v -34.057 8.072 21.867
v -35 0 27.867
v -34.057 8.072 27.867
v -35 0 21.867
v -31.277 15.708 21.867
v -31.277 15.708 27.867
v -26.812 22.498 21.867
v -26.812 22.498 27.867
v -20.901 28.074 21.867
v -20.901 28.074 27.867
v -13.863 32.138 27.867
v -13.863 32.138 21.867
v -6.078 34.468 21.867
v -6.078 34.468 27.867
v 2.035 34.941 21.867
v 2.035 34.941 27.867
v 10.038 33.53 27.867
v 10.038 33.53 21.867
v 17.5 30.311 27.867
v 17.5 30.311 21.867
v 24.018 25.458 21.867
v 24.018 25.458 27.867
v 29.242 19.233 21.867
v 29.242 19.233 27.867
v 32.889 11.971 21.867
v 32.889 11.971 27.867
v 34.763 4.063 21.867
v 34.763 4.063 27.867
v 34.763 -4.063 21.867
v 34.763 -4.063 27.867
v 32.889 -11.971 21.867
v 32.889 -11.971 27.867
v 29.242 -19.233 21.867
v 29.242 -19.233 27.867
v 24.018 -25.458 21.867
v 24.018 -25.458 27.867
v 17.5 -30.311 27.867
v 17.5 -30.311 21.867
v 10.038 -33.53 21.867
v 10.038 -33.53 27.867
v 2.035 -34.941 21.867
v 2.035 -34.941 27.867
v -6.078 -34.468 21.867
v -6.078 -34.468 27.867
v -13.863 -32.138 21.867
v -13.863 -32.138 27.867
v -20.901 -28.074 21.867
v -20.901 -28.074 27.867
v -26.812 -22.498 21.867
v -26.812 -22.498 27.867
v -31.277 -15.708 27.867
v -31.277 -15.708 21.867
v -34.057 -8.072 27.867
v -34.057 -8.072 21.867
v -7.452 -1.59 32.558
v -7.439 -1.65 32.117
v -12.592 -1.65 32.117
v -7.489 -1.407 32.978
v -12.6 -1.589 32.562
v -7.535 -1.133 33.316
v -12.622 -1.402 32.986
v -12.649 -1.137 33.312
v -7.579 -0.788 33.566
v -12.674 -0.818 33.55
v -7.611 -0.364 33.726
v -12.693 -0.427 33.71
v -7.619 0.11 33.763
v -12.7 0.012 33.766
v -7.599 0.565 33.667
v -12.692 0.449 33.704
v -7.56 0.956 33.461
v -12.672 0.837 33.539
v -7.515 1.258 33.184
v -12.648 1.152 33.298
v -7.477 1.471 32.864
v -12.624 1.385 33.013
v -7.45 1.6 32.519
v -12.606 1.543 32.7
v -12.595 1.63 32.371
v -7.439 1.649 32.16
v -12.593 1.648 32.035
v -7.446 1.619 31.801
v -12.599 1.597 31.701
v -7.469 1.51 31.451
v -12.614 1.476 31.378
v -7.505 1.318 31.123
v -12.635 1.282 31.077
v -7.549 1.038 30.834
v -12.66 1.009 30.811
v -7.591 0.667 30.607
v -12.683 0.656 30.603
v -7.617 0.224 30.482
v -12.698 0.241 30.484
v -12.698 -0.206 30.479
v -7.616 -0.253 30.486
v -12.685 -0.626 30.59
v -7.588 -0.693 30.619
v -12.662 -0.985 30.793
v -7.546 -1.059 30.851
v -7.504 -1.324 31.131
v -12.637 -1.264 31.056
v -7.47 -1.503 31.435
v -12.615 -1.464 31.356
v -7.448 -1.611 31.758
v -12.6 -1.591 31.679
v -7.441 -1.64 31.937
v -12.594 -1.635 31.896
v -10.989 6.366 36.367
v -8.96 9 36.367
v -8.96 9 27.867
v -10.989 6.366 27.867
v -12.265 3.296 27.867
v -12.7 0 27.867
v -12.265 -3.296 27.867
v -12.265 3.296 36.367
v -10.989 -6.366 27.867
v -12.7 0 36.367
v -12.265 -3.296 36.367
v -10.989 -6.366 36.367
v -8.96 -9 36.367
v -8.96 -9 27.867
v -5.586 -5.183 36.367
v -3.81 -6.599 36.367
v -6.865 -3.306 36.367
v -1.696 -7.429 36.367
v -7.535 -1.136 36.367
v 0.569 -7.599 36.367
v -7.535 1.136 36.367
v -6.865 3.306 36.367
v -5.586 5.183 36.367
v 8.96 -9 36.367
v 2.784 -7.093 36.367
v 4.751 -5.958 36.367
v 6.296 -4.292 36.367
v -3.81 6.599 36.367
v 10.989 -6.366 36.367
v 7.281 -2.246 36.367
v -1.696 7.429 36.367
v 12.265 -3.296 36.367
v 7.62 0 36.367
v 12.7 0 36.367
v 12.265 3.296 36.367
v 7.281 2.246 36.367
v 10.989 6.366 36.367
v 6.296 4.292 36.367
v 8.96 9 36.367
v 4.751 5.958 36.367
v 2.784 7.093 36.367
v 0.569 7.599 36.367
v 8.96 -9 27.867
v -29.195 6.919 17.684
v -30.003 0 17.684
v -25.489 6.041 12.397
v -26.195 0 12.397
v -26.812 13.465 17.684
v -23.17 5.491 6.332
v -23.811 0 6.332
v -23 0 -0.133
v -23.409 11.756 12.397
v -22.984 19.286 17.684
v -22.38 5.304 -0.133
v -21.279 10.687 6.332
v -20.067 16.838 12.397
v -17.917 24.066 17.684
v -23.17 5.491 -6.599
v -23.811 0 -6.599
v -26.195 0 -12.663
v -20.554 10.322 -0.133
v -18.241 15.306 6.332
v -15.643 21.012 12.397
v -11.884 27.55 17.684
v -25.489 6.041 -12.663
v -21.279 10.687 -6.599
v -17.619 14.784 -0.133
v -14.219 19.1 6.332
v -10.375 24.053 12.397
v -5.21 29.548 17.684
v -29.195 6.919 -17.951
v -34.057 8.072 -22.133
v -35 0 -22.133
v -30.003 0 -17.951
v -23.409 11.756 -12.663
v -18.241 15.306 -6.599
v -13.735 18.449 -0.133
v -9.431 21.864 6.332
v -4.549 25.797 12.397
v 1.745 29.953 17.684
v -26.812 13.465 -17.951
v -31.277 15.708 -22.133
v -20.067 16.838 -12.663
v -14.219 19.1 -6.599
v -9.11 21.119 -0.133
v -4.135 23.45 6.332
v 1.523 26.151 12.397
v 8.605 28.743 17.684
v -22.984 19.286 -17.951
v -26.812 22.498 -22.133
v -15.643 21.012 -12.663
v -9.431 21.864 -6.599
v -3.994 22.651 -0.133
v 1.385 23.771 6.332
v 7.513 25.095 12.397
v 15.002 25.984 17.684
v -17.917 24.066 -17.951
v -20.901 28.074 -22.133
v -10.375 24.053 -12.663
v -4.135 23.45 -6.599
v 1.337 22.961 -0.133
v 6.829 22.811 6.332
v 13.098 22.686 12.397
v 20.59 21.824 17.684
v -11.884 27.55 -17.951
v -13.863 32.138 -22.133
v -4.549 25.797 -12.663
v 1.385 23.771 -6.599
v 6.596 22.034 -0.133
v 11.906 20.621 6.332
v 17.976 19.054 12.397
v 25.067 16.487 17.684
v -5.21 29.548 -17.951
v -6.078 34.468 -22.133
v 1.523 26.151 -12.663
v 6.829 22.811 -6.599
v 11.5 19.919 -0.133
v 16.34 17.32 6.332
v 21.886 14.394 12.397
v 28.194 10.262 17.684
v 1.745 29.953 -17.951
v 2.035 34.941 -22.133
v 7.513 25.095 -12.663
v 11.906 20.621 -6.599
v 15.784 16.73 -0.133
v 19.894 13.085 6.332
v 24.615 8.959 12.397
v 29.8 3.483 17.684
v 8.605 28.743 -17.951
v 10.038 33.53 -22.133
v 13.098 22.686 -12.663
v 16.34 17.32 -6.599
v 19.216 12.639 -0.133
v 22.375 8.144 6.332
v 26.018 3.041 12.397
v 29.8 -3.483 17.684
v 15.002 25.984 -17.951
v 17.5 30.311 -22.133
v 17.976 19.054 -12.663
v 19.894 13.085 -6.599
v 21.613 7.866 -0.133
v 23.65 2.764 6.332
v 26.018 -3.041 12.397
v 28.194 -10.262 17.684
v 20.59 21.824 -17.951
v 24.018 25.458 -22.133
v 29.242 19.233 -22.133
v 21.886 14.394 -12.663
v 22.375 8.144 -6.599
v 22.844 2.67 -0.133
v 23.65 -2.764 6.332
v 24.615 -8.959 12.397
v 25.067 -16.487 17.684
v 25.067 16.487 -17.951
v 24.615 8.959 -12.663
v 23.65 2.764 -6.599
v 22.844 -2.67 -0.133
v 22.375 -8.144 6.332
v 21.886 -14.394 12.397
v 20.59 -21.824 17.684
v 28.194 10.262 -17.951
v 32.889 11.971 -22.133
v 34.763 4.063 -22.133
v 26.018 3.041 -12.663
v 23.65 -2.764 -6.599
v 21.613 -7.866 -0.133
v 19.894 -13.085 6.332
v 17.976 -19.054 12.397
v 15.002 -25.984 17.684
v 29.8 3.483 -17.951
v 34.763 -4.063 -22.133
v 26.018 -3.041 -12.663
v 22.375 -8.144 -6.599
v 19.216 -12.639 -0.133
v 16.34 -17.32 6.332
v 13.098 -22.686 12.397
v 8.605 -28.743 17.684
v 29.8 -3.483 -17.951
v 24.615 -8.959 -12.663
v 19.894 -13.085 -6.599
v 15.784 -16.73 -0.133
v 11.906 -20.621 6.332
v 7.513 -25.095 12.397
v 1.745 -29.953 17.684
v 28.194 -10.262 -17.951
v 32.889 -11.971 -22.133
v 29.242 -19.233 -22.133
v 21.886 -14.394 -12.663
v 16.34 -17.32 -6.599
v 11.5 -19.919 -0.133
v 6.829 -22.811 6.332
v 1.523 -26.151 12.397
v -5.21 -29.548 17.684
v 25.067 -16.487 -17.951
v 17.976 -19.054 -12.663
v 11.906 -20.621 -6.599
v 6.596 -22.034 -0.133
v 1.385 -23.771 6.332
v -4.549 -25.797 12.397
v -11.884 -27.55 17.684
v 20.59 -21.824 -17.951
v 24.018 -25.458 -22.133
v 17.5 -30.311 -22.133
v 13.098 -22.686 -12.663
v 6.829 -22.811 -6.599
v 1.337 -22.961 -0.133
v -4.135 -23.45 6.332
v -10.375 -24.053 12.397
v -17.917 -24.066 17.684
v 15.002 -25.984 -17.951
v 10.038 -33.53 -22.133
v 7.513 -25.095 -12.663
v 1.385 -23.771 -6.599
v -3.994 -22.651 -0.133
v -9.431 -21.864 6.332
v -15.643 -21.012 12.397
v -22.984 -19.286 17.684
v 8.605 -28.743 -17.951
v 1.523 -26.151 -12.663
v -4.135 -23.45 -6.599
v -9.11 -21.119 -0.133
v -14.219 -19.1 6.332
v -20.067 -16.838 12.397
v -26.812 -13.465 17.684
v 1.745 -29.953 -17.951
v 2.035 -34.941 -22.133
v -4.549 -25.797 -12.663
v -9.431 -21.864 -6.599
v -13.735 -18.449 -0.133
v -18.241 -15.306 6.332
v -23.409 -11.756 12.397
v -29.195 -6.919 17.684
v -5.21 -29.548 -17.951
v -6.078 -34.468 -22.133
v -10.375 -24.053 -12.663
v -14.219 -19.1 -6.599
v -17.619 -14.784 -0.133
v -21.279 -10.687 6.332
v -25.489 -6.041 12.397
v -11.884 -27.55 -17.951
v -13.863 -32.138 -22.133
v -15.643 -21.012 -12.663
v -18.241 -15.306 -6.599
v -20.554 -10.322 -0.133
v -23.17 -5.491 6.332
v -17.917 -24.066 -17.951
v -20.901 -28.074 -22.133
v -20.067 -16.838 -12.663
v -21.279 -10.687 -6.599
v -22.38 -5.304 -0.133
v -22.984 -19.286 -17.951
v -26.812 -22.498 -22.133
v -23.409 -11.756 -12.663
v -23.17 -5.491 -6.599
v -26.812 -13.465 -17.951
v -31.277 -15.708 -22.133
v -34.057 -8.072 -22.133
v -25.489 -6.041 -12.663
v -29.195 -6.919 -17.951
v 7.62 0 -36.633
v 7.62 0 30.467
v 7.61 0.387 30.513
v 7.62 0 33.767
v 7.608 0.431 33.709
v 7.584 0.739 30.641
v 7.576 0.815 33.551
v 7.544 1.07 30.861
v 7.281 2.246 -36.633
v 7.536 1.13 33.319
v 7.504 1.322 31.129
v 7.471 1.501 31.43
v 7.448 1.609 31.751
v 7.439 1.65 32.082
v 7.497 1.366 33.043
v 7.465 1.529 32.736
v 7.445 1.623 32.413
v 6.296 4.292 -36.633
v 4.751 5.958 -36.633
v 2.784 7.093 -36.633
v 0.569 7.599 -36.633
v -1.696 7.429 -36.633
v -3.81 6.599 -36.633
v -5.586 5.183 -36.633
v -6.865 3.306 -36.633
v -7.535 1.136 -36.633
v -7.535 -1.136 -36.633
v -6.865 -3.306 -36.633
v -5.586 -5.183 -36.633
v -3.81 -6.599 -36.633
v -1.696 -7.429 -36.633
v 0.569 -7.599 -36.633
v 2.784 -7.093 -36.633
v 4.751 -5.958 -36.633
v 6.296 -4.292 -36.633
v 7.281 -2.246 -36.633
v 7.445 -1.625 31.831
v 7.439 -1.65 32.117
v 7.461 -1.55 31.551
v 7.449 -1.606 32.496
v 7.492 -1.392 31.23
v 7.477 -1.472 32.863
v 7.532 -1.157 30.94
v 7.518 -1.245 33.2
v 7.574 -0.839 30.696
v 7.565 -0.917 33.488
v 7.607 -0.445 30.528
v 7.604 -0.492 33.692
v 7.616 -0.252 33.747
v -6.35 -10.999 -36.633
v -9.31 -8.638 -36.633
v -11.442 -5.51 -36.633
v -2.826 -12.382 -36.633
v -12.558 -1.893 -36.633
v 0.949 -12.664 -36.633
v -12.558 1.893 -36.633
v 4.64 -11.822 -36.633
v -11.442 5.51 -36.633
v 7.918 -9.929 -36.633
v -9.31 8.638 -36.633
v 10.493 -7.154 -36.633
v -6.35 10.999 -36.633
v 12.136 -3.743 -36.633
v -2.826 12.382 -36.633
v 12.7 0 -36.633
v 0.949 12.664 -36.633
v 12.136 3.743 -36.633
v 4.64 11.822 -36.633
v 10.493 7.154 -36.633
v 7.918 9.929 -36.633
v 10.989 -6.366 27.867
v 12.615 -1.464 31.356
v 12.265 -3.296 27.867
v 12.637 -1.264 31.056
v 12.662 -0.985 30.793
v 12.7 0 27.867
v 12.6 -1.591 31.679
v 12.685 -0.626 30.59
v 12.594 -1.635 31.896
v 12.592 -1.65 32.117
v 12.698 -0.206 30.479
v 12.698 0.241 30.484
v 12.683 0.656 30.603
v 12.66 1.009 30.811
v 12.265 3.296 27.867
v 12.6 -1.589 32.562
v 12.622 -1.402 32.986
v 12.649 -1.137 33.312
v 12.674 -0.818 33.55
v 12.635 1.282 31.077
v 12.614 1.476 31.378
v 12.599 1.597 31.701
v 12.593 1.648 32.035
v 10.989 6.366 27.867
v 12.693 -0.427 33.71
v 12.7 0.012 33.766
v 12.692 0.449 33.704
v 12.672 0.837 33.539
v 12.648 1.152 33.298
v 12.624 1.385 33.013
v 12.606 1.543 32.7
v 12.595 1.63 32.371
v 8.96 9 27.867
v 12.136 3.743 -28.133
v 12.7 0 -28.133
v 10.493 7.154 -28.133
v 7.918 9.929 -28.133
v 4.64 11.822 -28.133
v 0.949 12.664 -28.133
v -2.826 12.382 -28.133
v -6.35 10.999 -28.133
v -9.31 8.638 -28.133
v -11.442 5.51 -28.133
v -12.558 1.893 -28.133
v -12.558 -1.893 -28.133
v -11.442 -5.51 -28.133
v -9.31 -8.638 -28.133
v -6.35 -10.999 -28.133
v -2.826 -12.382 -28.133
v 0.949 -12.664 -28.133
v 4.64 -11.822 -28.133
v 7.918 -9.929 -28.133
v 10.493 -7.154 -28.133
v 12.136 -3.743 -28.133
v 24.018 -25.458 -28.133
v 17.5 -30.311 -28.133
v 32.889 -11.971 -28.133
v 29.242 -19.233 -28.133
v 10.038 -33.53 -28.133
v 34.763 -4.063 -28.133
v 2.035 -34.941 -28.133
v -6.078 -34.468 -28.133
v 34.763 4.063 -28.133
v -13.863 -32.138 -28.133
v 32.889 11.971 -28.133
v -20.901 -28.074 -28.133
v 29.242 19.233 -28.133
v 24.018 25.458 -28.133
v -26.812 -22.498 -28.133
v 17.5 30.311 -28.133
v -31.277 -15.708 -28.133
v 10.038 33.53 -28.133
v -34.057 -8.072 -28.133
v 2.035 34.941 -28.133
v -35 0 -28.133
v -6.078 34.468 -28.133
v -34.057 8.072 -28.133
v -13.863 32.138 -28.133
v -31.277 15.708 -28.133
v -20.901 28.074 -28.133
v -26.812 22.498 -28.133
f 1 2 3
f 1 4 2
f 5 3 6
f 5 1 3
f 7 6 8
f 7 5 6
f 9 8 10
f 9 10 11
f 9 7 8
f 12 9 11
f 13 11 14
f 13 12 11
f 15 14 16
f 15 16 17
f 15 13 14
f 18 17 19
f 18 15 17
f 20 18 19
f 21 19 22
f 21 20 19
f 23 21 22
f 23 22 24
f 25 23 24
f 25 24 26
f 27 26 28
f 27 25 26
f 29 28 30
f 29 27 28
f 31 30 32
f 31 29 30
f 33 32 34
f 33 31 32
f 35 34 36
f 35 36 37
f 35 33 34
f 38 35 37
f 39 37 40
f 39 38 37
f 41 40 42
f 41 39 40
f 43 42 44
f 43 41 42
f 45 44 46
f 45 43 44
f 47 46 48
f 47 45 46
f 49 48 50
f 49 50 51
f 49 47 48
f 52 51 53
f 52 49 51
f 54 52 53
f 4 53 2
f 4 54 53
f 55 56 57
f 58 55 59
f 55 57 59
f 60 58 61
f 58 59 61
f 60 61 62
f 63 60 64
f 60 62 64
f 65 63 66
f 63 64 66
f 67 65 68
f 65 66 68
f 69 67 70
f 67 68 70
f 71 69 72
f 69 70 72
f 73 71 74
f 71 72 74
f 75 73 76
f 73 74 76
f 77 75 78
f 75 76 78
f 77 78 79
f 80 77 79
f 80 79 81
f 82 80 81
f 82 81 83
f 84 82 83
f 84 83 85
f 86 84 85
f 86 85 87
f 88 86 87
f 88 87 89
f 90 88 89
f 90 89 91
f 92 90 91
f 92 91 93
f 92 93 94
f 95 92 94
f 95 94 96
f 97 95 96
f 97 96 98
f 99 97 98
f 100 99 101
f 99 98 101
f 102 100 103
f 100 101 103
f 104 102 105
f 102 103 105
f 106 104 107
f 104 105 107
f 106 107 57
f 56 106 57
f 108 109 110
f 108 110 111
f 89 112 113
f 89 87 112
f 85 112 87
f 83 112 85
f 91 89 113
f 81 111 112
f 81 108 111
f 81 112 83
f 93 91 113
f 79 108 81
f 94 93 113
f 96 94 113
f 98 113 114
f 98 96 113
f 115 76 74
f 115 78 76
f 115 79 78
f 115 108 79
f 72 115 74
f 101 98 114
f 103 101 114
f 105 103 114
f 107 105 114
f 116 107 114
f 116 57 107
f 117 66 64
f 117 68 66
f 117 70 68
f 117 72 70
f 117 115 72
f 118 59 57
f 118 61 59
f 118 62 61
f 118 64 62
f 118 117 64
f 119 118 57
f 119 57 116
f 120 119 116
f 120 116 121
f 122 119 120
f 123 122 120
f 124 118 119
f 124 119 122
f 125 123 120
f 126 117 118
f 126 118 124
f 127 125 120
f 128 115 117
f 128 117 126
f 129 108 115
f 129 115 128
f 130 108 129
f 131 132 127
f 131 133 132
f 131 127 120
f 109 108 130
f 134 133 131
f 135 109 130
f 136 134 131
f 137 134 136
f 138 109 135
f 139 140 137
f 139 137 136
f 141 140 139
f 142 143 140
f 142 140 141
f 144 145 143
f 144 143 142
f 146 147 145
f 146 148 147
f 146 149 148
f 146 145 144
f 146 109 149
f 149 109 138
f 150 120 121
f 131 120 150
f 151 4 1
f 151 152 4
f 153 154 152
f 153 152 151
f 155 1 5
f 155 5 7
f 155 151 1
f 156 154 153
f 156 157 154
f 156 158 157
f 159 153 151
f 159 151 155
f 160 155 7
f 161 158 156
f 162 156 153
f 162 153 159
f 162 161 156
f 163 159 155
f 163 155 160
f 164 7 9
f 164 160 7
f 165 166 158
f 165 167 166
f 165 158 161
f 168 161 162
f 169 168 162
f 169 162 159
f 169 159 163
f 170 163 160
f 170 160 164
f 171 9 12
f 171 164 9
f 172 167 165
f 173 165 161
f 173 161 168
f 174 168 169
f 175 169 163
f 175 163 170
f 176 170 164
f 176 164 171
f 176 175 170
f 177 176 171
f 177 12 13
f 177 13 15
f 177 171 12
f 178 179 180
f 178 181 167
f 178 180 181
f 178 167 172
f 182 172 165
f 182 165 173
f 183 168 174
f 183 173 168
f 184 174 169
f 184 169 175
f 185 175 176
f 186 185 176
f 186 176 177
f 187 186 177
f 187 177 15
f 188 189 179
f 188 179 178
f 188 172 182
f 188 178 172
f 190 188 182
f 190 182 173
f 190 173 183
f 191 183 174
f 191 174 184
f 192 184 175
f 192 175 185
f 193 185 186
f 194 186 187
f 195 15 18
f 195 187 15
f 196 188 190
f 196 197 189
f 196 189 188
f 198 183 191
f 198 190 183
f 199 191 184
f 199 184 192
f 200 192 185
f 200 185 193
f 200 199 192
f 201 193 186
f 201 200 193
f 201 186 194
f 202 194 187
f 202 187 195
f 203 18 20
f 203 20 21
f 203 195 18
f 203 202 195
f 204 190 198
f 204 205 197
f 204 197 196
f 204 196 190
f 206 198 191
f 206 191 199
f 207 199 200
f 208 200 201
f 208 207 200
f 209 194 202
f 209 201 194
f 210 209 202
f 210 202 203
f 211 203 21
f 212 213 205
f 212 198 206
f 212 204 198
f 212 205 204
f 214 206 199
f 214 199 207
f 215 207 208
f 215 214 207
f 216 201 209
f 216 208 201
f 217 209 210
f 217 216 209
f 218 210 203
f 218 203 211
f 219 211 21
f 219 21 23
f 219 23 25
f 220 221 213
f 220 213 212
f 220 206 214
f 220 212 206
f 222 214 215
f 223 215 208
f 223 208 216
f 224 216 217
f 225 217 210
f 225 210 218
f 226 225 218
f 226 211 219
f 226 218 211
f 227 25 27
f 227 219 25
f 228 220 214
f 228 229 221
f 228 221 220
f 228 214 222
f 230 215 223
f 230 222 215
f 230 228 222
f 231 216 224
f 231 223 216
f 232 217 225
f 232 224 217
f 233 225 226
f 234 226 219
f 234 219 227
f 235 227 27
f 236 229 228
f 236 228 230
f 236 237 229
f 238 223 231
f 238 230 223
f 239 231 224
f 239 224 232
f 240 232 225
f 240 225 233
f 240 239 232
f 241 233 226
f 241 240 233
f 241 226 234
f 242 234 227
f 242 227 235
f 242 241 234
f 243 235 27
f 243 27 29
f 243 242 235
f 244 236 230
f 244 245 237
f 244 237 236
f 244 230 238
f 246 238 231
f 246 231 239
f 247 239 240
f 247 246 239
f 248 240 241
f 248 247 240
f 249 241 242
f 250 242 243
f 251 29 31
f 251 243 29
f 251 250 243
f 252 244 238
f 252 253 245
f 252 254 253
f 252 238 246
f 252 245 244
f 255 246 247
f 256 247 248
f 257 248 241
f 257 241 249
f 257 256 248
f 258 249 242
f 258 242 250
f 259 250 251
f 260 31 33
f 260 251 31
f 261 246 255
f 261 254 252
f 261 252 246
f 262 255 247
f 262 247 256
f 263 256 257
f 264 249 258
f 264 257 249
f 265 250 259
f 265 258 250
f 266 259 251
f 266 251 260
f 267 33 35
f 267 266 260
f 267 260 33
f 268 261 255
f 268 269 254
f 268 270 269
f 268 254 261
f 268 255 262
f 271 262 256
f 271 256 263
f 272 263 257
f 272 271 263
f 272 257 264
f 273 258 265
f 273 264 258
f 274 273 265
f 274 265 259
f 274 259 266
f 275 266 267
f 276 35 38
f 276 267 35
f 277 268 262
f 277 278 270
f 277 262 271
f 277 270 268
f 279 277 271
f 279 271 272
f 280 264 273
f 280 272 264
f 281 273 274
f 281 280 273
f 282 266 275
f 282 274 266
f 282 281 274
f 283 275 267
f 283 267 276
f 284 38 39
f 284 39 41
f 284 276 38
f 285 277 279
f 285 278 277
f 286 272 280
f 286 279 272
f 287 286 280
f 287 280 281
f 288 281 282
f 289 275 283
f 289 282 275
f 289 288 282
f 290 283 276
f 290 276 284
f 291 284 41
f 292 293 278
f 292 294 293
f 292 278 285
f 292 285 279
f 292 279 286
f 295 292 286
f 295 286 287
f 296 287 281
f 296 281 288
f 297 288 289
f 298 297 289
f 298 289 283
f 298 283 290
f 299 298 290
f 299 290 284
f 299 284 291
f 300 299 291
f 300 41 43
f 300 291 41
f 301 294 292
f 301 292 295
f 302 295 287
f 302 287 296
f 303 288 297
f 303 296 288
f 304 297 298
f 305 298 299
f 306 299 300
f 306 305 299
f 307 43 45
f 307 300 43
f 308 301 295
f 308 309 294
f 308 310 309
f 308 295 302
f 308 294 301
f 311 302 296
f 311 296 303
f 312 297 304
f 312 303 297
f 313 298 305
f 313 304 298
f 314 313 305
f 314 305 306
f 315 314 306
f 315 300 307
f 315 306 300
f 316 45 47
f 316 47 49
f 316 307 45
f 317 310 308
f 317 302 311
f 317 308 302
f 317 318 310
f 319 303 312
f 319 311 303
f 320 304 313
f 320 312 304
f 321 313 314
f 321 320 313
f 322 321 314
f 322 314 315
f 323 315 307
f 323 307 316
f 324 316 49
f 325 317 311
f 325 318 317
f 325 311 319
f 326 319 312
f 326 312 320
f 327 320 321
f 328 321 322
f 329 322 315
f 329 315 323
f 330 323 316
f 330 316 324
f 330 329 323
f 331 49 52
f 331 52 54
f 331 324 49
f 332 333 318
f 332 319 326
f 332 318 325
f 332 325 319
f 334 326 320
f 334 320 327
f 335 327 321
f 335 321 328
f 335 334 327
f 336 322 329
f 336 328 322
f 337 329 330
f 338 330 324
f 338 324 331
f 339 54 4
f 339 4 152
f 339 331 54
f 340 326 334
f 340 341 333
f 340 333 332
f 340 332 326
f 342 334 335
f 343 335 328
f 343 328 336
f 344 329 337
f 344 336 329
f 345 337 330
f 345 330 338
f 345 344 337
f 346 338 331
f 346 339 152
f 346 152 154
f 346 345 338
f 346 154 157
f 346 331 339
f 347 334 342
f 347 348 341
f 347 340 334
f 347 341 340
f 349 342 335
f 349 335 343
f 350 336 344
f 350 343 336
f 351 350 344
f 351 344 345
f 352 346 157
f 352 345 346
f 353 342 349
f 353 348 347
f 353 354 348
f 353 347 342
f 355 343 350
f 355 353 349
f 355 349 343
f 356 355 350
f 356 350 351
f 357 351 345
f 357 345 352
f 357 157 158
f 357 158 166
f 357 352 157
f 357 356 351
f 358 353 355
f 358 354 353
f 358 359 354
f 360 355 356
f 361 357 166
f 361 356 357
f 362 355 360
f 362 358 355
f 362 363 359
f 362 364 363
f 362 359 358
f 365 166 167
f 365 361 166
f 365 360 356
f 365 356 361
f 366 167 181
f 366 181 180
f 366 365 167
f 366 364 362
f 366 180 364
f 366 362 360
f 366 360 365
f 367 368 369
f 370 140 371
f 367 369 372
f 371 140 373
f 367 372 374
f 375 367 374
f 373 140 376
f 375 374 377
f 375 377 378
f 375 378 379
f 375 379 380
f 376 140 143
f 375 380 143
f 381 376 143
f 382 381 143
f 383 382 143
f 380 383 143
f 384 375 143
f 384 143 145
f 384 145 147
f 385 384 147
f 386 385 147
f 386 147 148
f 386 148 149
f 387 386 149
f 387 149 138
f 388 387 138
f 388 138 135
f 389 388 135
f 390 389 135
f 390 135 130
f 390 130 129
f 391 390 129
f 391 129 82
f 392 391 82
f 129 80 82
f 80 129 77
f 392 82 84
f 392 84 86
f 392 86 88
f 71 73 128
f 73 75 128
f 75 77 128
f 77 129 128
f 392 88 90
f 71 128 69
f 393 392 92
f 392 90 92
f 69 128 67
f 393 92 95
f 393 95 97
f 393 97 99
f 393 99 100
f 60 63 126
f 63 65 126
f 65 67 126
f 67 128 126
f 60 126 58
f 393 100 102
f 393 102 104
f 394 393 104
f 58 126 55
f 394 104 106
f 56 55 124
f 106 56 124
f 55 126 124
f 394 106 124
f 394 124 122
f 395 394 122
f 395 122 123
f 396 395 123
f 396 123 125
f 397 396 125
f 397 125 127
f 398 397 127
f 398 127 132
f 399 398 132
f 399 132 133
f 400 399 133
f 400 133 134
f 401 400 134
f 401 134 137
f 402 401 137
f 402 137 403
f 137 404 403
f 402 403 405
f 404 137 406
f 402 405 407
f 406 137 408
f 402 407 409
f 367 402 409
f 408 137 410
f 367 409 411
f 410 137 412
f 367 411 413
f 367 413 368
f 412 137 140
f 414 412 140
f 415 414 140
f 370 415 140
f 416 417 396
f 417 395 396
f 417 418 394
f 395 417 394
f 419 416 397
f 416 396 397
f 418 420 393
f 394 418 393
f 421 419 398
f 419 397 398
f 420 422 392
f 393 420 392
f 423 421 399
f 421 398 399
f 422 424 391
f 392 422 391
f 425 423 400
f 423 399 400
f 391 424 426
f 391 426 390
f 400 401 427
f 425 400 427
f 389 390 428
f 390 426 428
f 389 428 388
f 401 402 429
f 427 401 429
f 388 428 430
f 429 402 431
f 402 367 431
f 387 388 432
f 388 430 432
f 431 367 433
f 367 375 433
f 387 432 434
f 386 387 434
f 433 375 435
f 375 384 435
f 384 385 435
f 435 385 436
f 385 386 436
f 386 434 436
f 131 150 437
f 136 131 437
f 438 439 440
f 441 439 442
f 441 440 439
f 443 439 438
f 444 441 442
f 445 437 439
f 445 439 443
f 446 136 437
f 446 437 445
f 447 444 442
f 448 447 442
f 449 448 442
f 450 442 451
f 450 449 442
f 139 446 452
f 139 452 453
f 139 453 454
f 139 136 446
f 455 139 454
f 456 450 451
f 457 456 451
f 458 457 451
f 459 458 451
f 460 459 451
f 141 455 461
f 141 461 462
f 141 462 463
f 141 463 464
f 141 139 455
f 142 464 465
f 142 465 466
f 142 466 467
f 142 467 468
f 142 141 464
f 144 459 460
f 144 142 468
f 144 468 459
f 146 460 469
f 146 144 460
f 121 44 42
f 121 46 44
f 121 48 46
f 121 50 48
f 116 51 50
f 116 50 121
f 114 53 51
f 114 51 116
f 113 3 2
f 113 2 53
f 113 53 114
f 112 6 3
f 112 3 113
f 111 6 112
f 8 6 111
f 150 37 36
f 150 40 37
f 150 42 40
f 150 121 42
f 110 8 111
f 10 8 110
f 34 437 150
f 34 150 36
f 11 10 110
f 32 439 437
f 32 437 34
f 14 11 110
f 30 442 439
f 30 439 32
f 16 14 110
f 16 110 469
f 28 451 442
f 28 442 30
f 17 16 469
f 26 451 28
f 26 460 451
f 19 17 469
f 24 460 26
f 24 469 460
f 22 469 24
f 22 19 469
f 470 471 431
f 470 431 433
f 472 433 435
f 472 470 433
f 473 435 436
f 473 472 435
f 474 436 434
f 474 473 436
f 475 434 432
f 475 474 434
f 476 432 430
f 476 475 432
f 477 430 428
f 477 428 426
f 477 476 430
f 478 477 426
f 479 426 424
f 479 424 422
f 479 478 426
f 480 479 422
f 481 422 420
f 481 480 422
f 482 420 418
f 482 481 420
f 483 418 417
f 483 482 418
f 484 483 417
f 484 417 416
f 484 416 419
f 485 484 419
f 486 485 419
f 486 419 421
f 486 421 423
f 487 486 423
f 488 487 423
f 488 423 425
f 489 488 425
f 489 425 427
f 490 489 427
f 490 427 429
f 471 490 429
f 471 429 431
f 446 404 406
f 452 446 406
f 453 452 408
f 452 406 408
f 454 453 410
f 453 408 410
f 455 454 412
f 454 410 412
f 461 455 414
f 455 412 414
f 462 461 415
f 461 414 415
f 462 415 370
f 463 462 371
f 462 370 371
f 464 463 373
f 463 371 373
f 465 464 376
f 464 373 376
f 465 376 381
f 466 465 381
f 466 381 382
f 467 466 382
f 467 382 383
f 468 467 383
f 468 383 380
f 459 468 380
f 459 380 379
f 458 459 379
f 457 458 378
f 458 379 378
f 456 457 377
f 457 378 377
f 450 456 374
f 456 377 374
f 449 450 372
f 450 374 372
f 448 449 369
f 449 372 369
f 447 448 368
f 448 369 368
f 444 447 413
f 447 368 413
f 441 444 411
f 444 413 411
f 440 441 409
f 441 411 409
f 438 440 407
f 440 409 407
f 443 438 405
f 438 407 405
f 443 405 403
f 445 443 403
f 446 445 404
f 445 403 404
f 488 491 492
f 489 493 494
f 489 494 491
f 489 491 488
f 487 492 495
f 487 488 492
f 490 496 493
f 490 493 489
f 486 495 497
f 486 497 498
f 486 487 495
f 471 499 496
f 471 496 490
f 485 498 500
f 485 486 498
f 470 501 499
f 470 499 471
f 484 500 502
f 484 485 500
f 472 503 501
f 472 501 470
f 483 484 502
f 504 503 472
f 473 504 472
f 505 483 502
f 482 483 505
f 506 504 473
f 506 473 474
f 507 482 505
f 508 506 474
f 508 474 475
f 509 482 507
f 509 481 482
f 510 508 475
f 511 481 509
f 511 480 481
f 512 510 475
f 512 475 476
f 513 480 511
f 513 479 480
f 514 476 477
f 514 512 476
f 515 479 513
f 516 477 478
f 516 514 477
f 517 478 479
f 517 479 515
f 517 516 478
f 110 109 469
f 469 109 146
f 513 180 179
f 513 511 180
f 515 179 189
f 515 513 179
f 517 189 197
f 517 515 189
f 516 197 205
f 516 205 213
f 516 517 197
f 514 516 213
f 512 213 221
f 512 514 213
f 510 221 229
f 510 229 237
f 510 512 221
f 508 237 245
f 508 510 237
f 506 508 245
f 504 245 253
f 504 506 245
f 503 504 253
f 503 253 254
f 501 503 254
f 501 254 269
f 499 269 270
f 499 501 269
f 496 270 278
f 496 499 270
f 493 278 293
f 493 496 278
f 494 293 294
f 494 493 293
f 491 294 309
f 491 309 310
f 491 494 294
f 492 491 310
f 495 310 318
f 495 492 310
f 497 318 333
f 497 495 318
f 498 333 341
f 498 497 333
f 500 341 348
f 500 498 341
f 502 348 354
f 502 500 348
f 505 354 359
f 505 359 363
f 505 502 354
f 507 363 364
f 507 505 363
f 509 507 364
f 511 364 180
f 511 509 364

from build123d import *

# Parameters (mm, degrees)
F3_R      = 12.7
F4_DEPTH  = 64.501
F5_DEPTH  = 73
F6_R      = 7.62
F7_DEPTH  = 73.001
F8_W      = 30
F8_H      = 4.40173278
F9_DEPTH  = 8.5
F12_D     = 3.3
F12_DEPTH = 30
F12_TIP   = 0.9914200214


with BuildPart() as f1:
    # F0 (on Front) → F1 (revolve)
    with BuildSketch(Plane.XZ):
        with BuildLine():
            Line((0, -28.1334591306), (0, 27.8665408694))
            Line((0, 27.8665408694), (-35, 27.8665408694))
            Line((-35, 27.8665408694), (-35, 21.8665408694))
            ThreePointArc((-35, 21.8665408694), (-23, -0.1334591306), (-35, -22.1334591306))
            Line((-35, -22.1334591306), (-35, -28.1334591306))
            Line((-35, -28.1334591306), (0, -28.1334591306))
        make_face()
    revolve(axis=Axis((0, 0, -0.1334591306), (0, 0, -1)))

    # F3 (on offset) → F4 (cut, through all)
    with BuildSketch(Plane.XY.offset(36.3665408694)):
        Circle(F3_R)
    extrude(amount=-F4_DEPTH, mode=Mode.SUBTRACT)

    # F3 (on offset) → F5 (join)
    with BuildSketch(Plane.XY.offset(36.3665408694)):
        Circle(F3_R)
    extrude(amount=-F5_DEPTH)

    # F6 (on face) → F7 (cut, through all)
    with BuildSketch(Plane.XY.offset(36.3665408694)):
        Circle(F6_R)
    extrude(amount=-F7_DEPTH, mode=Mode.SUBTRACT)

    # F8 (on face) → F9 (cut)
    with BuildSketch(Plane.XY.offset(36.3665408694)):
        with Locations((0, -11.20086639)):
            Rectangle(F8_W, F8_H)
        Polygon((-15, 9), (15, 9), (15.7737210393, 16.7225152254), (-15, 16.7225152254), align=None)
    extrude(amount=-F9_DEPTH, mode=Mode.SUBTRACT)

    # F12
    with Locations(Plane.YZ.offset(12.7)):
        with Locations((0, 32.1165408694)):
            Hole(F12_D / 2, depth=F12_DEPTH)
            with Locations((0, 0, -(F12_DEPTH + F12_TIP / 2))):  # 118° drill point
                Cone(0, F12_D / 2, F12_TIP, mode=Mode.SUBTRACT)


solid = f1.part
